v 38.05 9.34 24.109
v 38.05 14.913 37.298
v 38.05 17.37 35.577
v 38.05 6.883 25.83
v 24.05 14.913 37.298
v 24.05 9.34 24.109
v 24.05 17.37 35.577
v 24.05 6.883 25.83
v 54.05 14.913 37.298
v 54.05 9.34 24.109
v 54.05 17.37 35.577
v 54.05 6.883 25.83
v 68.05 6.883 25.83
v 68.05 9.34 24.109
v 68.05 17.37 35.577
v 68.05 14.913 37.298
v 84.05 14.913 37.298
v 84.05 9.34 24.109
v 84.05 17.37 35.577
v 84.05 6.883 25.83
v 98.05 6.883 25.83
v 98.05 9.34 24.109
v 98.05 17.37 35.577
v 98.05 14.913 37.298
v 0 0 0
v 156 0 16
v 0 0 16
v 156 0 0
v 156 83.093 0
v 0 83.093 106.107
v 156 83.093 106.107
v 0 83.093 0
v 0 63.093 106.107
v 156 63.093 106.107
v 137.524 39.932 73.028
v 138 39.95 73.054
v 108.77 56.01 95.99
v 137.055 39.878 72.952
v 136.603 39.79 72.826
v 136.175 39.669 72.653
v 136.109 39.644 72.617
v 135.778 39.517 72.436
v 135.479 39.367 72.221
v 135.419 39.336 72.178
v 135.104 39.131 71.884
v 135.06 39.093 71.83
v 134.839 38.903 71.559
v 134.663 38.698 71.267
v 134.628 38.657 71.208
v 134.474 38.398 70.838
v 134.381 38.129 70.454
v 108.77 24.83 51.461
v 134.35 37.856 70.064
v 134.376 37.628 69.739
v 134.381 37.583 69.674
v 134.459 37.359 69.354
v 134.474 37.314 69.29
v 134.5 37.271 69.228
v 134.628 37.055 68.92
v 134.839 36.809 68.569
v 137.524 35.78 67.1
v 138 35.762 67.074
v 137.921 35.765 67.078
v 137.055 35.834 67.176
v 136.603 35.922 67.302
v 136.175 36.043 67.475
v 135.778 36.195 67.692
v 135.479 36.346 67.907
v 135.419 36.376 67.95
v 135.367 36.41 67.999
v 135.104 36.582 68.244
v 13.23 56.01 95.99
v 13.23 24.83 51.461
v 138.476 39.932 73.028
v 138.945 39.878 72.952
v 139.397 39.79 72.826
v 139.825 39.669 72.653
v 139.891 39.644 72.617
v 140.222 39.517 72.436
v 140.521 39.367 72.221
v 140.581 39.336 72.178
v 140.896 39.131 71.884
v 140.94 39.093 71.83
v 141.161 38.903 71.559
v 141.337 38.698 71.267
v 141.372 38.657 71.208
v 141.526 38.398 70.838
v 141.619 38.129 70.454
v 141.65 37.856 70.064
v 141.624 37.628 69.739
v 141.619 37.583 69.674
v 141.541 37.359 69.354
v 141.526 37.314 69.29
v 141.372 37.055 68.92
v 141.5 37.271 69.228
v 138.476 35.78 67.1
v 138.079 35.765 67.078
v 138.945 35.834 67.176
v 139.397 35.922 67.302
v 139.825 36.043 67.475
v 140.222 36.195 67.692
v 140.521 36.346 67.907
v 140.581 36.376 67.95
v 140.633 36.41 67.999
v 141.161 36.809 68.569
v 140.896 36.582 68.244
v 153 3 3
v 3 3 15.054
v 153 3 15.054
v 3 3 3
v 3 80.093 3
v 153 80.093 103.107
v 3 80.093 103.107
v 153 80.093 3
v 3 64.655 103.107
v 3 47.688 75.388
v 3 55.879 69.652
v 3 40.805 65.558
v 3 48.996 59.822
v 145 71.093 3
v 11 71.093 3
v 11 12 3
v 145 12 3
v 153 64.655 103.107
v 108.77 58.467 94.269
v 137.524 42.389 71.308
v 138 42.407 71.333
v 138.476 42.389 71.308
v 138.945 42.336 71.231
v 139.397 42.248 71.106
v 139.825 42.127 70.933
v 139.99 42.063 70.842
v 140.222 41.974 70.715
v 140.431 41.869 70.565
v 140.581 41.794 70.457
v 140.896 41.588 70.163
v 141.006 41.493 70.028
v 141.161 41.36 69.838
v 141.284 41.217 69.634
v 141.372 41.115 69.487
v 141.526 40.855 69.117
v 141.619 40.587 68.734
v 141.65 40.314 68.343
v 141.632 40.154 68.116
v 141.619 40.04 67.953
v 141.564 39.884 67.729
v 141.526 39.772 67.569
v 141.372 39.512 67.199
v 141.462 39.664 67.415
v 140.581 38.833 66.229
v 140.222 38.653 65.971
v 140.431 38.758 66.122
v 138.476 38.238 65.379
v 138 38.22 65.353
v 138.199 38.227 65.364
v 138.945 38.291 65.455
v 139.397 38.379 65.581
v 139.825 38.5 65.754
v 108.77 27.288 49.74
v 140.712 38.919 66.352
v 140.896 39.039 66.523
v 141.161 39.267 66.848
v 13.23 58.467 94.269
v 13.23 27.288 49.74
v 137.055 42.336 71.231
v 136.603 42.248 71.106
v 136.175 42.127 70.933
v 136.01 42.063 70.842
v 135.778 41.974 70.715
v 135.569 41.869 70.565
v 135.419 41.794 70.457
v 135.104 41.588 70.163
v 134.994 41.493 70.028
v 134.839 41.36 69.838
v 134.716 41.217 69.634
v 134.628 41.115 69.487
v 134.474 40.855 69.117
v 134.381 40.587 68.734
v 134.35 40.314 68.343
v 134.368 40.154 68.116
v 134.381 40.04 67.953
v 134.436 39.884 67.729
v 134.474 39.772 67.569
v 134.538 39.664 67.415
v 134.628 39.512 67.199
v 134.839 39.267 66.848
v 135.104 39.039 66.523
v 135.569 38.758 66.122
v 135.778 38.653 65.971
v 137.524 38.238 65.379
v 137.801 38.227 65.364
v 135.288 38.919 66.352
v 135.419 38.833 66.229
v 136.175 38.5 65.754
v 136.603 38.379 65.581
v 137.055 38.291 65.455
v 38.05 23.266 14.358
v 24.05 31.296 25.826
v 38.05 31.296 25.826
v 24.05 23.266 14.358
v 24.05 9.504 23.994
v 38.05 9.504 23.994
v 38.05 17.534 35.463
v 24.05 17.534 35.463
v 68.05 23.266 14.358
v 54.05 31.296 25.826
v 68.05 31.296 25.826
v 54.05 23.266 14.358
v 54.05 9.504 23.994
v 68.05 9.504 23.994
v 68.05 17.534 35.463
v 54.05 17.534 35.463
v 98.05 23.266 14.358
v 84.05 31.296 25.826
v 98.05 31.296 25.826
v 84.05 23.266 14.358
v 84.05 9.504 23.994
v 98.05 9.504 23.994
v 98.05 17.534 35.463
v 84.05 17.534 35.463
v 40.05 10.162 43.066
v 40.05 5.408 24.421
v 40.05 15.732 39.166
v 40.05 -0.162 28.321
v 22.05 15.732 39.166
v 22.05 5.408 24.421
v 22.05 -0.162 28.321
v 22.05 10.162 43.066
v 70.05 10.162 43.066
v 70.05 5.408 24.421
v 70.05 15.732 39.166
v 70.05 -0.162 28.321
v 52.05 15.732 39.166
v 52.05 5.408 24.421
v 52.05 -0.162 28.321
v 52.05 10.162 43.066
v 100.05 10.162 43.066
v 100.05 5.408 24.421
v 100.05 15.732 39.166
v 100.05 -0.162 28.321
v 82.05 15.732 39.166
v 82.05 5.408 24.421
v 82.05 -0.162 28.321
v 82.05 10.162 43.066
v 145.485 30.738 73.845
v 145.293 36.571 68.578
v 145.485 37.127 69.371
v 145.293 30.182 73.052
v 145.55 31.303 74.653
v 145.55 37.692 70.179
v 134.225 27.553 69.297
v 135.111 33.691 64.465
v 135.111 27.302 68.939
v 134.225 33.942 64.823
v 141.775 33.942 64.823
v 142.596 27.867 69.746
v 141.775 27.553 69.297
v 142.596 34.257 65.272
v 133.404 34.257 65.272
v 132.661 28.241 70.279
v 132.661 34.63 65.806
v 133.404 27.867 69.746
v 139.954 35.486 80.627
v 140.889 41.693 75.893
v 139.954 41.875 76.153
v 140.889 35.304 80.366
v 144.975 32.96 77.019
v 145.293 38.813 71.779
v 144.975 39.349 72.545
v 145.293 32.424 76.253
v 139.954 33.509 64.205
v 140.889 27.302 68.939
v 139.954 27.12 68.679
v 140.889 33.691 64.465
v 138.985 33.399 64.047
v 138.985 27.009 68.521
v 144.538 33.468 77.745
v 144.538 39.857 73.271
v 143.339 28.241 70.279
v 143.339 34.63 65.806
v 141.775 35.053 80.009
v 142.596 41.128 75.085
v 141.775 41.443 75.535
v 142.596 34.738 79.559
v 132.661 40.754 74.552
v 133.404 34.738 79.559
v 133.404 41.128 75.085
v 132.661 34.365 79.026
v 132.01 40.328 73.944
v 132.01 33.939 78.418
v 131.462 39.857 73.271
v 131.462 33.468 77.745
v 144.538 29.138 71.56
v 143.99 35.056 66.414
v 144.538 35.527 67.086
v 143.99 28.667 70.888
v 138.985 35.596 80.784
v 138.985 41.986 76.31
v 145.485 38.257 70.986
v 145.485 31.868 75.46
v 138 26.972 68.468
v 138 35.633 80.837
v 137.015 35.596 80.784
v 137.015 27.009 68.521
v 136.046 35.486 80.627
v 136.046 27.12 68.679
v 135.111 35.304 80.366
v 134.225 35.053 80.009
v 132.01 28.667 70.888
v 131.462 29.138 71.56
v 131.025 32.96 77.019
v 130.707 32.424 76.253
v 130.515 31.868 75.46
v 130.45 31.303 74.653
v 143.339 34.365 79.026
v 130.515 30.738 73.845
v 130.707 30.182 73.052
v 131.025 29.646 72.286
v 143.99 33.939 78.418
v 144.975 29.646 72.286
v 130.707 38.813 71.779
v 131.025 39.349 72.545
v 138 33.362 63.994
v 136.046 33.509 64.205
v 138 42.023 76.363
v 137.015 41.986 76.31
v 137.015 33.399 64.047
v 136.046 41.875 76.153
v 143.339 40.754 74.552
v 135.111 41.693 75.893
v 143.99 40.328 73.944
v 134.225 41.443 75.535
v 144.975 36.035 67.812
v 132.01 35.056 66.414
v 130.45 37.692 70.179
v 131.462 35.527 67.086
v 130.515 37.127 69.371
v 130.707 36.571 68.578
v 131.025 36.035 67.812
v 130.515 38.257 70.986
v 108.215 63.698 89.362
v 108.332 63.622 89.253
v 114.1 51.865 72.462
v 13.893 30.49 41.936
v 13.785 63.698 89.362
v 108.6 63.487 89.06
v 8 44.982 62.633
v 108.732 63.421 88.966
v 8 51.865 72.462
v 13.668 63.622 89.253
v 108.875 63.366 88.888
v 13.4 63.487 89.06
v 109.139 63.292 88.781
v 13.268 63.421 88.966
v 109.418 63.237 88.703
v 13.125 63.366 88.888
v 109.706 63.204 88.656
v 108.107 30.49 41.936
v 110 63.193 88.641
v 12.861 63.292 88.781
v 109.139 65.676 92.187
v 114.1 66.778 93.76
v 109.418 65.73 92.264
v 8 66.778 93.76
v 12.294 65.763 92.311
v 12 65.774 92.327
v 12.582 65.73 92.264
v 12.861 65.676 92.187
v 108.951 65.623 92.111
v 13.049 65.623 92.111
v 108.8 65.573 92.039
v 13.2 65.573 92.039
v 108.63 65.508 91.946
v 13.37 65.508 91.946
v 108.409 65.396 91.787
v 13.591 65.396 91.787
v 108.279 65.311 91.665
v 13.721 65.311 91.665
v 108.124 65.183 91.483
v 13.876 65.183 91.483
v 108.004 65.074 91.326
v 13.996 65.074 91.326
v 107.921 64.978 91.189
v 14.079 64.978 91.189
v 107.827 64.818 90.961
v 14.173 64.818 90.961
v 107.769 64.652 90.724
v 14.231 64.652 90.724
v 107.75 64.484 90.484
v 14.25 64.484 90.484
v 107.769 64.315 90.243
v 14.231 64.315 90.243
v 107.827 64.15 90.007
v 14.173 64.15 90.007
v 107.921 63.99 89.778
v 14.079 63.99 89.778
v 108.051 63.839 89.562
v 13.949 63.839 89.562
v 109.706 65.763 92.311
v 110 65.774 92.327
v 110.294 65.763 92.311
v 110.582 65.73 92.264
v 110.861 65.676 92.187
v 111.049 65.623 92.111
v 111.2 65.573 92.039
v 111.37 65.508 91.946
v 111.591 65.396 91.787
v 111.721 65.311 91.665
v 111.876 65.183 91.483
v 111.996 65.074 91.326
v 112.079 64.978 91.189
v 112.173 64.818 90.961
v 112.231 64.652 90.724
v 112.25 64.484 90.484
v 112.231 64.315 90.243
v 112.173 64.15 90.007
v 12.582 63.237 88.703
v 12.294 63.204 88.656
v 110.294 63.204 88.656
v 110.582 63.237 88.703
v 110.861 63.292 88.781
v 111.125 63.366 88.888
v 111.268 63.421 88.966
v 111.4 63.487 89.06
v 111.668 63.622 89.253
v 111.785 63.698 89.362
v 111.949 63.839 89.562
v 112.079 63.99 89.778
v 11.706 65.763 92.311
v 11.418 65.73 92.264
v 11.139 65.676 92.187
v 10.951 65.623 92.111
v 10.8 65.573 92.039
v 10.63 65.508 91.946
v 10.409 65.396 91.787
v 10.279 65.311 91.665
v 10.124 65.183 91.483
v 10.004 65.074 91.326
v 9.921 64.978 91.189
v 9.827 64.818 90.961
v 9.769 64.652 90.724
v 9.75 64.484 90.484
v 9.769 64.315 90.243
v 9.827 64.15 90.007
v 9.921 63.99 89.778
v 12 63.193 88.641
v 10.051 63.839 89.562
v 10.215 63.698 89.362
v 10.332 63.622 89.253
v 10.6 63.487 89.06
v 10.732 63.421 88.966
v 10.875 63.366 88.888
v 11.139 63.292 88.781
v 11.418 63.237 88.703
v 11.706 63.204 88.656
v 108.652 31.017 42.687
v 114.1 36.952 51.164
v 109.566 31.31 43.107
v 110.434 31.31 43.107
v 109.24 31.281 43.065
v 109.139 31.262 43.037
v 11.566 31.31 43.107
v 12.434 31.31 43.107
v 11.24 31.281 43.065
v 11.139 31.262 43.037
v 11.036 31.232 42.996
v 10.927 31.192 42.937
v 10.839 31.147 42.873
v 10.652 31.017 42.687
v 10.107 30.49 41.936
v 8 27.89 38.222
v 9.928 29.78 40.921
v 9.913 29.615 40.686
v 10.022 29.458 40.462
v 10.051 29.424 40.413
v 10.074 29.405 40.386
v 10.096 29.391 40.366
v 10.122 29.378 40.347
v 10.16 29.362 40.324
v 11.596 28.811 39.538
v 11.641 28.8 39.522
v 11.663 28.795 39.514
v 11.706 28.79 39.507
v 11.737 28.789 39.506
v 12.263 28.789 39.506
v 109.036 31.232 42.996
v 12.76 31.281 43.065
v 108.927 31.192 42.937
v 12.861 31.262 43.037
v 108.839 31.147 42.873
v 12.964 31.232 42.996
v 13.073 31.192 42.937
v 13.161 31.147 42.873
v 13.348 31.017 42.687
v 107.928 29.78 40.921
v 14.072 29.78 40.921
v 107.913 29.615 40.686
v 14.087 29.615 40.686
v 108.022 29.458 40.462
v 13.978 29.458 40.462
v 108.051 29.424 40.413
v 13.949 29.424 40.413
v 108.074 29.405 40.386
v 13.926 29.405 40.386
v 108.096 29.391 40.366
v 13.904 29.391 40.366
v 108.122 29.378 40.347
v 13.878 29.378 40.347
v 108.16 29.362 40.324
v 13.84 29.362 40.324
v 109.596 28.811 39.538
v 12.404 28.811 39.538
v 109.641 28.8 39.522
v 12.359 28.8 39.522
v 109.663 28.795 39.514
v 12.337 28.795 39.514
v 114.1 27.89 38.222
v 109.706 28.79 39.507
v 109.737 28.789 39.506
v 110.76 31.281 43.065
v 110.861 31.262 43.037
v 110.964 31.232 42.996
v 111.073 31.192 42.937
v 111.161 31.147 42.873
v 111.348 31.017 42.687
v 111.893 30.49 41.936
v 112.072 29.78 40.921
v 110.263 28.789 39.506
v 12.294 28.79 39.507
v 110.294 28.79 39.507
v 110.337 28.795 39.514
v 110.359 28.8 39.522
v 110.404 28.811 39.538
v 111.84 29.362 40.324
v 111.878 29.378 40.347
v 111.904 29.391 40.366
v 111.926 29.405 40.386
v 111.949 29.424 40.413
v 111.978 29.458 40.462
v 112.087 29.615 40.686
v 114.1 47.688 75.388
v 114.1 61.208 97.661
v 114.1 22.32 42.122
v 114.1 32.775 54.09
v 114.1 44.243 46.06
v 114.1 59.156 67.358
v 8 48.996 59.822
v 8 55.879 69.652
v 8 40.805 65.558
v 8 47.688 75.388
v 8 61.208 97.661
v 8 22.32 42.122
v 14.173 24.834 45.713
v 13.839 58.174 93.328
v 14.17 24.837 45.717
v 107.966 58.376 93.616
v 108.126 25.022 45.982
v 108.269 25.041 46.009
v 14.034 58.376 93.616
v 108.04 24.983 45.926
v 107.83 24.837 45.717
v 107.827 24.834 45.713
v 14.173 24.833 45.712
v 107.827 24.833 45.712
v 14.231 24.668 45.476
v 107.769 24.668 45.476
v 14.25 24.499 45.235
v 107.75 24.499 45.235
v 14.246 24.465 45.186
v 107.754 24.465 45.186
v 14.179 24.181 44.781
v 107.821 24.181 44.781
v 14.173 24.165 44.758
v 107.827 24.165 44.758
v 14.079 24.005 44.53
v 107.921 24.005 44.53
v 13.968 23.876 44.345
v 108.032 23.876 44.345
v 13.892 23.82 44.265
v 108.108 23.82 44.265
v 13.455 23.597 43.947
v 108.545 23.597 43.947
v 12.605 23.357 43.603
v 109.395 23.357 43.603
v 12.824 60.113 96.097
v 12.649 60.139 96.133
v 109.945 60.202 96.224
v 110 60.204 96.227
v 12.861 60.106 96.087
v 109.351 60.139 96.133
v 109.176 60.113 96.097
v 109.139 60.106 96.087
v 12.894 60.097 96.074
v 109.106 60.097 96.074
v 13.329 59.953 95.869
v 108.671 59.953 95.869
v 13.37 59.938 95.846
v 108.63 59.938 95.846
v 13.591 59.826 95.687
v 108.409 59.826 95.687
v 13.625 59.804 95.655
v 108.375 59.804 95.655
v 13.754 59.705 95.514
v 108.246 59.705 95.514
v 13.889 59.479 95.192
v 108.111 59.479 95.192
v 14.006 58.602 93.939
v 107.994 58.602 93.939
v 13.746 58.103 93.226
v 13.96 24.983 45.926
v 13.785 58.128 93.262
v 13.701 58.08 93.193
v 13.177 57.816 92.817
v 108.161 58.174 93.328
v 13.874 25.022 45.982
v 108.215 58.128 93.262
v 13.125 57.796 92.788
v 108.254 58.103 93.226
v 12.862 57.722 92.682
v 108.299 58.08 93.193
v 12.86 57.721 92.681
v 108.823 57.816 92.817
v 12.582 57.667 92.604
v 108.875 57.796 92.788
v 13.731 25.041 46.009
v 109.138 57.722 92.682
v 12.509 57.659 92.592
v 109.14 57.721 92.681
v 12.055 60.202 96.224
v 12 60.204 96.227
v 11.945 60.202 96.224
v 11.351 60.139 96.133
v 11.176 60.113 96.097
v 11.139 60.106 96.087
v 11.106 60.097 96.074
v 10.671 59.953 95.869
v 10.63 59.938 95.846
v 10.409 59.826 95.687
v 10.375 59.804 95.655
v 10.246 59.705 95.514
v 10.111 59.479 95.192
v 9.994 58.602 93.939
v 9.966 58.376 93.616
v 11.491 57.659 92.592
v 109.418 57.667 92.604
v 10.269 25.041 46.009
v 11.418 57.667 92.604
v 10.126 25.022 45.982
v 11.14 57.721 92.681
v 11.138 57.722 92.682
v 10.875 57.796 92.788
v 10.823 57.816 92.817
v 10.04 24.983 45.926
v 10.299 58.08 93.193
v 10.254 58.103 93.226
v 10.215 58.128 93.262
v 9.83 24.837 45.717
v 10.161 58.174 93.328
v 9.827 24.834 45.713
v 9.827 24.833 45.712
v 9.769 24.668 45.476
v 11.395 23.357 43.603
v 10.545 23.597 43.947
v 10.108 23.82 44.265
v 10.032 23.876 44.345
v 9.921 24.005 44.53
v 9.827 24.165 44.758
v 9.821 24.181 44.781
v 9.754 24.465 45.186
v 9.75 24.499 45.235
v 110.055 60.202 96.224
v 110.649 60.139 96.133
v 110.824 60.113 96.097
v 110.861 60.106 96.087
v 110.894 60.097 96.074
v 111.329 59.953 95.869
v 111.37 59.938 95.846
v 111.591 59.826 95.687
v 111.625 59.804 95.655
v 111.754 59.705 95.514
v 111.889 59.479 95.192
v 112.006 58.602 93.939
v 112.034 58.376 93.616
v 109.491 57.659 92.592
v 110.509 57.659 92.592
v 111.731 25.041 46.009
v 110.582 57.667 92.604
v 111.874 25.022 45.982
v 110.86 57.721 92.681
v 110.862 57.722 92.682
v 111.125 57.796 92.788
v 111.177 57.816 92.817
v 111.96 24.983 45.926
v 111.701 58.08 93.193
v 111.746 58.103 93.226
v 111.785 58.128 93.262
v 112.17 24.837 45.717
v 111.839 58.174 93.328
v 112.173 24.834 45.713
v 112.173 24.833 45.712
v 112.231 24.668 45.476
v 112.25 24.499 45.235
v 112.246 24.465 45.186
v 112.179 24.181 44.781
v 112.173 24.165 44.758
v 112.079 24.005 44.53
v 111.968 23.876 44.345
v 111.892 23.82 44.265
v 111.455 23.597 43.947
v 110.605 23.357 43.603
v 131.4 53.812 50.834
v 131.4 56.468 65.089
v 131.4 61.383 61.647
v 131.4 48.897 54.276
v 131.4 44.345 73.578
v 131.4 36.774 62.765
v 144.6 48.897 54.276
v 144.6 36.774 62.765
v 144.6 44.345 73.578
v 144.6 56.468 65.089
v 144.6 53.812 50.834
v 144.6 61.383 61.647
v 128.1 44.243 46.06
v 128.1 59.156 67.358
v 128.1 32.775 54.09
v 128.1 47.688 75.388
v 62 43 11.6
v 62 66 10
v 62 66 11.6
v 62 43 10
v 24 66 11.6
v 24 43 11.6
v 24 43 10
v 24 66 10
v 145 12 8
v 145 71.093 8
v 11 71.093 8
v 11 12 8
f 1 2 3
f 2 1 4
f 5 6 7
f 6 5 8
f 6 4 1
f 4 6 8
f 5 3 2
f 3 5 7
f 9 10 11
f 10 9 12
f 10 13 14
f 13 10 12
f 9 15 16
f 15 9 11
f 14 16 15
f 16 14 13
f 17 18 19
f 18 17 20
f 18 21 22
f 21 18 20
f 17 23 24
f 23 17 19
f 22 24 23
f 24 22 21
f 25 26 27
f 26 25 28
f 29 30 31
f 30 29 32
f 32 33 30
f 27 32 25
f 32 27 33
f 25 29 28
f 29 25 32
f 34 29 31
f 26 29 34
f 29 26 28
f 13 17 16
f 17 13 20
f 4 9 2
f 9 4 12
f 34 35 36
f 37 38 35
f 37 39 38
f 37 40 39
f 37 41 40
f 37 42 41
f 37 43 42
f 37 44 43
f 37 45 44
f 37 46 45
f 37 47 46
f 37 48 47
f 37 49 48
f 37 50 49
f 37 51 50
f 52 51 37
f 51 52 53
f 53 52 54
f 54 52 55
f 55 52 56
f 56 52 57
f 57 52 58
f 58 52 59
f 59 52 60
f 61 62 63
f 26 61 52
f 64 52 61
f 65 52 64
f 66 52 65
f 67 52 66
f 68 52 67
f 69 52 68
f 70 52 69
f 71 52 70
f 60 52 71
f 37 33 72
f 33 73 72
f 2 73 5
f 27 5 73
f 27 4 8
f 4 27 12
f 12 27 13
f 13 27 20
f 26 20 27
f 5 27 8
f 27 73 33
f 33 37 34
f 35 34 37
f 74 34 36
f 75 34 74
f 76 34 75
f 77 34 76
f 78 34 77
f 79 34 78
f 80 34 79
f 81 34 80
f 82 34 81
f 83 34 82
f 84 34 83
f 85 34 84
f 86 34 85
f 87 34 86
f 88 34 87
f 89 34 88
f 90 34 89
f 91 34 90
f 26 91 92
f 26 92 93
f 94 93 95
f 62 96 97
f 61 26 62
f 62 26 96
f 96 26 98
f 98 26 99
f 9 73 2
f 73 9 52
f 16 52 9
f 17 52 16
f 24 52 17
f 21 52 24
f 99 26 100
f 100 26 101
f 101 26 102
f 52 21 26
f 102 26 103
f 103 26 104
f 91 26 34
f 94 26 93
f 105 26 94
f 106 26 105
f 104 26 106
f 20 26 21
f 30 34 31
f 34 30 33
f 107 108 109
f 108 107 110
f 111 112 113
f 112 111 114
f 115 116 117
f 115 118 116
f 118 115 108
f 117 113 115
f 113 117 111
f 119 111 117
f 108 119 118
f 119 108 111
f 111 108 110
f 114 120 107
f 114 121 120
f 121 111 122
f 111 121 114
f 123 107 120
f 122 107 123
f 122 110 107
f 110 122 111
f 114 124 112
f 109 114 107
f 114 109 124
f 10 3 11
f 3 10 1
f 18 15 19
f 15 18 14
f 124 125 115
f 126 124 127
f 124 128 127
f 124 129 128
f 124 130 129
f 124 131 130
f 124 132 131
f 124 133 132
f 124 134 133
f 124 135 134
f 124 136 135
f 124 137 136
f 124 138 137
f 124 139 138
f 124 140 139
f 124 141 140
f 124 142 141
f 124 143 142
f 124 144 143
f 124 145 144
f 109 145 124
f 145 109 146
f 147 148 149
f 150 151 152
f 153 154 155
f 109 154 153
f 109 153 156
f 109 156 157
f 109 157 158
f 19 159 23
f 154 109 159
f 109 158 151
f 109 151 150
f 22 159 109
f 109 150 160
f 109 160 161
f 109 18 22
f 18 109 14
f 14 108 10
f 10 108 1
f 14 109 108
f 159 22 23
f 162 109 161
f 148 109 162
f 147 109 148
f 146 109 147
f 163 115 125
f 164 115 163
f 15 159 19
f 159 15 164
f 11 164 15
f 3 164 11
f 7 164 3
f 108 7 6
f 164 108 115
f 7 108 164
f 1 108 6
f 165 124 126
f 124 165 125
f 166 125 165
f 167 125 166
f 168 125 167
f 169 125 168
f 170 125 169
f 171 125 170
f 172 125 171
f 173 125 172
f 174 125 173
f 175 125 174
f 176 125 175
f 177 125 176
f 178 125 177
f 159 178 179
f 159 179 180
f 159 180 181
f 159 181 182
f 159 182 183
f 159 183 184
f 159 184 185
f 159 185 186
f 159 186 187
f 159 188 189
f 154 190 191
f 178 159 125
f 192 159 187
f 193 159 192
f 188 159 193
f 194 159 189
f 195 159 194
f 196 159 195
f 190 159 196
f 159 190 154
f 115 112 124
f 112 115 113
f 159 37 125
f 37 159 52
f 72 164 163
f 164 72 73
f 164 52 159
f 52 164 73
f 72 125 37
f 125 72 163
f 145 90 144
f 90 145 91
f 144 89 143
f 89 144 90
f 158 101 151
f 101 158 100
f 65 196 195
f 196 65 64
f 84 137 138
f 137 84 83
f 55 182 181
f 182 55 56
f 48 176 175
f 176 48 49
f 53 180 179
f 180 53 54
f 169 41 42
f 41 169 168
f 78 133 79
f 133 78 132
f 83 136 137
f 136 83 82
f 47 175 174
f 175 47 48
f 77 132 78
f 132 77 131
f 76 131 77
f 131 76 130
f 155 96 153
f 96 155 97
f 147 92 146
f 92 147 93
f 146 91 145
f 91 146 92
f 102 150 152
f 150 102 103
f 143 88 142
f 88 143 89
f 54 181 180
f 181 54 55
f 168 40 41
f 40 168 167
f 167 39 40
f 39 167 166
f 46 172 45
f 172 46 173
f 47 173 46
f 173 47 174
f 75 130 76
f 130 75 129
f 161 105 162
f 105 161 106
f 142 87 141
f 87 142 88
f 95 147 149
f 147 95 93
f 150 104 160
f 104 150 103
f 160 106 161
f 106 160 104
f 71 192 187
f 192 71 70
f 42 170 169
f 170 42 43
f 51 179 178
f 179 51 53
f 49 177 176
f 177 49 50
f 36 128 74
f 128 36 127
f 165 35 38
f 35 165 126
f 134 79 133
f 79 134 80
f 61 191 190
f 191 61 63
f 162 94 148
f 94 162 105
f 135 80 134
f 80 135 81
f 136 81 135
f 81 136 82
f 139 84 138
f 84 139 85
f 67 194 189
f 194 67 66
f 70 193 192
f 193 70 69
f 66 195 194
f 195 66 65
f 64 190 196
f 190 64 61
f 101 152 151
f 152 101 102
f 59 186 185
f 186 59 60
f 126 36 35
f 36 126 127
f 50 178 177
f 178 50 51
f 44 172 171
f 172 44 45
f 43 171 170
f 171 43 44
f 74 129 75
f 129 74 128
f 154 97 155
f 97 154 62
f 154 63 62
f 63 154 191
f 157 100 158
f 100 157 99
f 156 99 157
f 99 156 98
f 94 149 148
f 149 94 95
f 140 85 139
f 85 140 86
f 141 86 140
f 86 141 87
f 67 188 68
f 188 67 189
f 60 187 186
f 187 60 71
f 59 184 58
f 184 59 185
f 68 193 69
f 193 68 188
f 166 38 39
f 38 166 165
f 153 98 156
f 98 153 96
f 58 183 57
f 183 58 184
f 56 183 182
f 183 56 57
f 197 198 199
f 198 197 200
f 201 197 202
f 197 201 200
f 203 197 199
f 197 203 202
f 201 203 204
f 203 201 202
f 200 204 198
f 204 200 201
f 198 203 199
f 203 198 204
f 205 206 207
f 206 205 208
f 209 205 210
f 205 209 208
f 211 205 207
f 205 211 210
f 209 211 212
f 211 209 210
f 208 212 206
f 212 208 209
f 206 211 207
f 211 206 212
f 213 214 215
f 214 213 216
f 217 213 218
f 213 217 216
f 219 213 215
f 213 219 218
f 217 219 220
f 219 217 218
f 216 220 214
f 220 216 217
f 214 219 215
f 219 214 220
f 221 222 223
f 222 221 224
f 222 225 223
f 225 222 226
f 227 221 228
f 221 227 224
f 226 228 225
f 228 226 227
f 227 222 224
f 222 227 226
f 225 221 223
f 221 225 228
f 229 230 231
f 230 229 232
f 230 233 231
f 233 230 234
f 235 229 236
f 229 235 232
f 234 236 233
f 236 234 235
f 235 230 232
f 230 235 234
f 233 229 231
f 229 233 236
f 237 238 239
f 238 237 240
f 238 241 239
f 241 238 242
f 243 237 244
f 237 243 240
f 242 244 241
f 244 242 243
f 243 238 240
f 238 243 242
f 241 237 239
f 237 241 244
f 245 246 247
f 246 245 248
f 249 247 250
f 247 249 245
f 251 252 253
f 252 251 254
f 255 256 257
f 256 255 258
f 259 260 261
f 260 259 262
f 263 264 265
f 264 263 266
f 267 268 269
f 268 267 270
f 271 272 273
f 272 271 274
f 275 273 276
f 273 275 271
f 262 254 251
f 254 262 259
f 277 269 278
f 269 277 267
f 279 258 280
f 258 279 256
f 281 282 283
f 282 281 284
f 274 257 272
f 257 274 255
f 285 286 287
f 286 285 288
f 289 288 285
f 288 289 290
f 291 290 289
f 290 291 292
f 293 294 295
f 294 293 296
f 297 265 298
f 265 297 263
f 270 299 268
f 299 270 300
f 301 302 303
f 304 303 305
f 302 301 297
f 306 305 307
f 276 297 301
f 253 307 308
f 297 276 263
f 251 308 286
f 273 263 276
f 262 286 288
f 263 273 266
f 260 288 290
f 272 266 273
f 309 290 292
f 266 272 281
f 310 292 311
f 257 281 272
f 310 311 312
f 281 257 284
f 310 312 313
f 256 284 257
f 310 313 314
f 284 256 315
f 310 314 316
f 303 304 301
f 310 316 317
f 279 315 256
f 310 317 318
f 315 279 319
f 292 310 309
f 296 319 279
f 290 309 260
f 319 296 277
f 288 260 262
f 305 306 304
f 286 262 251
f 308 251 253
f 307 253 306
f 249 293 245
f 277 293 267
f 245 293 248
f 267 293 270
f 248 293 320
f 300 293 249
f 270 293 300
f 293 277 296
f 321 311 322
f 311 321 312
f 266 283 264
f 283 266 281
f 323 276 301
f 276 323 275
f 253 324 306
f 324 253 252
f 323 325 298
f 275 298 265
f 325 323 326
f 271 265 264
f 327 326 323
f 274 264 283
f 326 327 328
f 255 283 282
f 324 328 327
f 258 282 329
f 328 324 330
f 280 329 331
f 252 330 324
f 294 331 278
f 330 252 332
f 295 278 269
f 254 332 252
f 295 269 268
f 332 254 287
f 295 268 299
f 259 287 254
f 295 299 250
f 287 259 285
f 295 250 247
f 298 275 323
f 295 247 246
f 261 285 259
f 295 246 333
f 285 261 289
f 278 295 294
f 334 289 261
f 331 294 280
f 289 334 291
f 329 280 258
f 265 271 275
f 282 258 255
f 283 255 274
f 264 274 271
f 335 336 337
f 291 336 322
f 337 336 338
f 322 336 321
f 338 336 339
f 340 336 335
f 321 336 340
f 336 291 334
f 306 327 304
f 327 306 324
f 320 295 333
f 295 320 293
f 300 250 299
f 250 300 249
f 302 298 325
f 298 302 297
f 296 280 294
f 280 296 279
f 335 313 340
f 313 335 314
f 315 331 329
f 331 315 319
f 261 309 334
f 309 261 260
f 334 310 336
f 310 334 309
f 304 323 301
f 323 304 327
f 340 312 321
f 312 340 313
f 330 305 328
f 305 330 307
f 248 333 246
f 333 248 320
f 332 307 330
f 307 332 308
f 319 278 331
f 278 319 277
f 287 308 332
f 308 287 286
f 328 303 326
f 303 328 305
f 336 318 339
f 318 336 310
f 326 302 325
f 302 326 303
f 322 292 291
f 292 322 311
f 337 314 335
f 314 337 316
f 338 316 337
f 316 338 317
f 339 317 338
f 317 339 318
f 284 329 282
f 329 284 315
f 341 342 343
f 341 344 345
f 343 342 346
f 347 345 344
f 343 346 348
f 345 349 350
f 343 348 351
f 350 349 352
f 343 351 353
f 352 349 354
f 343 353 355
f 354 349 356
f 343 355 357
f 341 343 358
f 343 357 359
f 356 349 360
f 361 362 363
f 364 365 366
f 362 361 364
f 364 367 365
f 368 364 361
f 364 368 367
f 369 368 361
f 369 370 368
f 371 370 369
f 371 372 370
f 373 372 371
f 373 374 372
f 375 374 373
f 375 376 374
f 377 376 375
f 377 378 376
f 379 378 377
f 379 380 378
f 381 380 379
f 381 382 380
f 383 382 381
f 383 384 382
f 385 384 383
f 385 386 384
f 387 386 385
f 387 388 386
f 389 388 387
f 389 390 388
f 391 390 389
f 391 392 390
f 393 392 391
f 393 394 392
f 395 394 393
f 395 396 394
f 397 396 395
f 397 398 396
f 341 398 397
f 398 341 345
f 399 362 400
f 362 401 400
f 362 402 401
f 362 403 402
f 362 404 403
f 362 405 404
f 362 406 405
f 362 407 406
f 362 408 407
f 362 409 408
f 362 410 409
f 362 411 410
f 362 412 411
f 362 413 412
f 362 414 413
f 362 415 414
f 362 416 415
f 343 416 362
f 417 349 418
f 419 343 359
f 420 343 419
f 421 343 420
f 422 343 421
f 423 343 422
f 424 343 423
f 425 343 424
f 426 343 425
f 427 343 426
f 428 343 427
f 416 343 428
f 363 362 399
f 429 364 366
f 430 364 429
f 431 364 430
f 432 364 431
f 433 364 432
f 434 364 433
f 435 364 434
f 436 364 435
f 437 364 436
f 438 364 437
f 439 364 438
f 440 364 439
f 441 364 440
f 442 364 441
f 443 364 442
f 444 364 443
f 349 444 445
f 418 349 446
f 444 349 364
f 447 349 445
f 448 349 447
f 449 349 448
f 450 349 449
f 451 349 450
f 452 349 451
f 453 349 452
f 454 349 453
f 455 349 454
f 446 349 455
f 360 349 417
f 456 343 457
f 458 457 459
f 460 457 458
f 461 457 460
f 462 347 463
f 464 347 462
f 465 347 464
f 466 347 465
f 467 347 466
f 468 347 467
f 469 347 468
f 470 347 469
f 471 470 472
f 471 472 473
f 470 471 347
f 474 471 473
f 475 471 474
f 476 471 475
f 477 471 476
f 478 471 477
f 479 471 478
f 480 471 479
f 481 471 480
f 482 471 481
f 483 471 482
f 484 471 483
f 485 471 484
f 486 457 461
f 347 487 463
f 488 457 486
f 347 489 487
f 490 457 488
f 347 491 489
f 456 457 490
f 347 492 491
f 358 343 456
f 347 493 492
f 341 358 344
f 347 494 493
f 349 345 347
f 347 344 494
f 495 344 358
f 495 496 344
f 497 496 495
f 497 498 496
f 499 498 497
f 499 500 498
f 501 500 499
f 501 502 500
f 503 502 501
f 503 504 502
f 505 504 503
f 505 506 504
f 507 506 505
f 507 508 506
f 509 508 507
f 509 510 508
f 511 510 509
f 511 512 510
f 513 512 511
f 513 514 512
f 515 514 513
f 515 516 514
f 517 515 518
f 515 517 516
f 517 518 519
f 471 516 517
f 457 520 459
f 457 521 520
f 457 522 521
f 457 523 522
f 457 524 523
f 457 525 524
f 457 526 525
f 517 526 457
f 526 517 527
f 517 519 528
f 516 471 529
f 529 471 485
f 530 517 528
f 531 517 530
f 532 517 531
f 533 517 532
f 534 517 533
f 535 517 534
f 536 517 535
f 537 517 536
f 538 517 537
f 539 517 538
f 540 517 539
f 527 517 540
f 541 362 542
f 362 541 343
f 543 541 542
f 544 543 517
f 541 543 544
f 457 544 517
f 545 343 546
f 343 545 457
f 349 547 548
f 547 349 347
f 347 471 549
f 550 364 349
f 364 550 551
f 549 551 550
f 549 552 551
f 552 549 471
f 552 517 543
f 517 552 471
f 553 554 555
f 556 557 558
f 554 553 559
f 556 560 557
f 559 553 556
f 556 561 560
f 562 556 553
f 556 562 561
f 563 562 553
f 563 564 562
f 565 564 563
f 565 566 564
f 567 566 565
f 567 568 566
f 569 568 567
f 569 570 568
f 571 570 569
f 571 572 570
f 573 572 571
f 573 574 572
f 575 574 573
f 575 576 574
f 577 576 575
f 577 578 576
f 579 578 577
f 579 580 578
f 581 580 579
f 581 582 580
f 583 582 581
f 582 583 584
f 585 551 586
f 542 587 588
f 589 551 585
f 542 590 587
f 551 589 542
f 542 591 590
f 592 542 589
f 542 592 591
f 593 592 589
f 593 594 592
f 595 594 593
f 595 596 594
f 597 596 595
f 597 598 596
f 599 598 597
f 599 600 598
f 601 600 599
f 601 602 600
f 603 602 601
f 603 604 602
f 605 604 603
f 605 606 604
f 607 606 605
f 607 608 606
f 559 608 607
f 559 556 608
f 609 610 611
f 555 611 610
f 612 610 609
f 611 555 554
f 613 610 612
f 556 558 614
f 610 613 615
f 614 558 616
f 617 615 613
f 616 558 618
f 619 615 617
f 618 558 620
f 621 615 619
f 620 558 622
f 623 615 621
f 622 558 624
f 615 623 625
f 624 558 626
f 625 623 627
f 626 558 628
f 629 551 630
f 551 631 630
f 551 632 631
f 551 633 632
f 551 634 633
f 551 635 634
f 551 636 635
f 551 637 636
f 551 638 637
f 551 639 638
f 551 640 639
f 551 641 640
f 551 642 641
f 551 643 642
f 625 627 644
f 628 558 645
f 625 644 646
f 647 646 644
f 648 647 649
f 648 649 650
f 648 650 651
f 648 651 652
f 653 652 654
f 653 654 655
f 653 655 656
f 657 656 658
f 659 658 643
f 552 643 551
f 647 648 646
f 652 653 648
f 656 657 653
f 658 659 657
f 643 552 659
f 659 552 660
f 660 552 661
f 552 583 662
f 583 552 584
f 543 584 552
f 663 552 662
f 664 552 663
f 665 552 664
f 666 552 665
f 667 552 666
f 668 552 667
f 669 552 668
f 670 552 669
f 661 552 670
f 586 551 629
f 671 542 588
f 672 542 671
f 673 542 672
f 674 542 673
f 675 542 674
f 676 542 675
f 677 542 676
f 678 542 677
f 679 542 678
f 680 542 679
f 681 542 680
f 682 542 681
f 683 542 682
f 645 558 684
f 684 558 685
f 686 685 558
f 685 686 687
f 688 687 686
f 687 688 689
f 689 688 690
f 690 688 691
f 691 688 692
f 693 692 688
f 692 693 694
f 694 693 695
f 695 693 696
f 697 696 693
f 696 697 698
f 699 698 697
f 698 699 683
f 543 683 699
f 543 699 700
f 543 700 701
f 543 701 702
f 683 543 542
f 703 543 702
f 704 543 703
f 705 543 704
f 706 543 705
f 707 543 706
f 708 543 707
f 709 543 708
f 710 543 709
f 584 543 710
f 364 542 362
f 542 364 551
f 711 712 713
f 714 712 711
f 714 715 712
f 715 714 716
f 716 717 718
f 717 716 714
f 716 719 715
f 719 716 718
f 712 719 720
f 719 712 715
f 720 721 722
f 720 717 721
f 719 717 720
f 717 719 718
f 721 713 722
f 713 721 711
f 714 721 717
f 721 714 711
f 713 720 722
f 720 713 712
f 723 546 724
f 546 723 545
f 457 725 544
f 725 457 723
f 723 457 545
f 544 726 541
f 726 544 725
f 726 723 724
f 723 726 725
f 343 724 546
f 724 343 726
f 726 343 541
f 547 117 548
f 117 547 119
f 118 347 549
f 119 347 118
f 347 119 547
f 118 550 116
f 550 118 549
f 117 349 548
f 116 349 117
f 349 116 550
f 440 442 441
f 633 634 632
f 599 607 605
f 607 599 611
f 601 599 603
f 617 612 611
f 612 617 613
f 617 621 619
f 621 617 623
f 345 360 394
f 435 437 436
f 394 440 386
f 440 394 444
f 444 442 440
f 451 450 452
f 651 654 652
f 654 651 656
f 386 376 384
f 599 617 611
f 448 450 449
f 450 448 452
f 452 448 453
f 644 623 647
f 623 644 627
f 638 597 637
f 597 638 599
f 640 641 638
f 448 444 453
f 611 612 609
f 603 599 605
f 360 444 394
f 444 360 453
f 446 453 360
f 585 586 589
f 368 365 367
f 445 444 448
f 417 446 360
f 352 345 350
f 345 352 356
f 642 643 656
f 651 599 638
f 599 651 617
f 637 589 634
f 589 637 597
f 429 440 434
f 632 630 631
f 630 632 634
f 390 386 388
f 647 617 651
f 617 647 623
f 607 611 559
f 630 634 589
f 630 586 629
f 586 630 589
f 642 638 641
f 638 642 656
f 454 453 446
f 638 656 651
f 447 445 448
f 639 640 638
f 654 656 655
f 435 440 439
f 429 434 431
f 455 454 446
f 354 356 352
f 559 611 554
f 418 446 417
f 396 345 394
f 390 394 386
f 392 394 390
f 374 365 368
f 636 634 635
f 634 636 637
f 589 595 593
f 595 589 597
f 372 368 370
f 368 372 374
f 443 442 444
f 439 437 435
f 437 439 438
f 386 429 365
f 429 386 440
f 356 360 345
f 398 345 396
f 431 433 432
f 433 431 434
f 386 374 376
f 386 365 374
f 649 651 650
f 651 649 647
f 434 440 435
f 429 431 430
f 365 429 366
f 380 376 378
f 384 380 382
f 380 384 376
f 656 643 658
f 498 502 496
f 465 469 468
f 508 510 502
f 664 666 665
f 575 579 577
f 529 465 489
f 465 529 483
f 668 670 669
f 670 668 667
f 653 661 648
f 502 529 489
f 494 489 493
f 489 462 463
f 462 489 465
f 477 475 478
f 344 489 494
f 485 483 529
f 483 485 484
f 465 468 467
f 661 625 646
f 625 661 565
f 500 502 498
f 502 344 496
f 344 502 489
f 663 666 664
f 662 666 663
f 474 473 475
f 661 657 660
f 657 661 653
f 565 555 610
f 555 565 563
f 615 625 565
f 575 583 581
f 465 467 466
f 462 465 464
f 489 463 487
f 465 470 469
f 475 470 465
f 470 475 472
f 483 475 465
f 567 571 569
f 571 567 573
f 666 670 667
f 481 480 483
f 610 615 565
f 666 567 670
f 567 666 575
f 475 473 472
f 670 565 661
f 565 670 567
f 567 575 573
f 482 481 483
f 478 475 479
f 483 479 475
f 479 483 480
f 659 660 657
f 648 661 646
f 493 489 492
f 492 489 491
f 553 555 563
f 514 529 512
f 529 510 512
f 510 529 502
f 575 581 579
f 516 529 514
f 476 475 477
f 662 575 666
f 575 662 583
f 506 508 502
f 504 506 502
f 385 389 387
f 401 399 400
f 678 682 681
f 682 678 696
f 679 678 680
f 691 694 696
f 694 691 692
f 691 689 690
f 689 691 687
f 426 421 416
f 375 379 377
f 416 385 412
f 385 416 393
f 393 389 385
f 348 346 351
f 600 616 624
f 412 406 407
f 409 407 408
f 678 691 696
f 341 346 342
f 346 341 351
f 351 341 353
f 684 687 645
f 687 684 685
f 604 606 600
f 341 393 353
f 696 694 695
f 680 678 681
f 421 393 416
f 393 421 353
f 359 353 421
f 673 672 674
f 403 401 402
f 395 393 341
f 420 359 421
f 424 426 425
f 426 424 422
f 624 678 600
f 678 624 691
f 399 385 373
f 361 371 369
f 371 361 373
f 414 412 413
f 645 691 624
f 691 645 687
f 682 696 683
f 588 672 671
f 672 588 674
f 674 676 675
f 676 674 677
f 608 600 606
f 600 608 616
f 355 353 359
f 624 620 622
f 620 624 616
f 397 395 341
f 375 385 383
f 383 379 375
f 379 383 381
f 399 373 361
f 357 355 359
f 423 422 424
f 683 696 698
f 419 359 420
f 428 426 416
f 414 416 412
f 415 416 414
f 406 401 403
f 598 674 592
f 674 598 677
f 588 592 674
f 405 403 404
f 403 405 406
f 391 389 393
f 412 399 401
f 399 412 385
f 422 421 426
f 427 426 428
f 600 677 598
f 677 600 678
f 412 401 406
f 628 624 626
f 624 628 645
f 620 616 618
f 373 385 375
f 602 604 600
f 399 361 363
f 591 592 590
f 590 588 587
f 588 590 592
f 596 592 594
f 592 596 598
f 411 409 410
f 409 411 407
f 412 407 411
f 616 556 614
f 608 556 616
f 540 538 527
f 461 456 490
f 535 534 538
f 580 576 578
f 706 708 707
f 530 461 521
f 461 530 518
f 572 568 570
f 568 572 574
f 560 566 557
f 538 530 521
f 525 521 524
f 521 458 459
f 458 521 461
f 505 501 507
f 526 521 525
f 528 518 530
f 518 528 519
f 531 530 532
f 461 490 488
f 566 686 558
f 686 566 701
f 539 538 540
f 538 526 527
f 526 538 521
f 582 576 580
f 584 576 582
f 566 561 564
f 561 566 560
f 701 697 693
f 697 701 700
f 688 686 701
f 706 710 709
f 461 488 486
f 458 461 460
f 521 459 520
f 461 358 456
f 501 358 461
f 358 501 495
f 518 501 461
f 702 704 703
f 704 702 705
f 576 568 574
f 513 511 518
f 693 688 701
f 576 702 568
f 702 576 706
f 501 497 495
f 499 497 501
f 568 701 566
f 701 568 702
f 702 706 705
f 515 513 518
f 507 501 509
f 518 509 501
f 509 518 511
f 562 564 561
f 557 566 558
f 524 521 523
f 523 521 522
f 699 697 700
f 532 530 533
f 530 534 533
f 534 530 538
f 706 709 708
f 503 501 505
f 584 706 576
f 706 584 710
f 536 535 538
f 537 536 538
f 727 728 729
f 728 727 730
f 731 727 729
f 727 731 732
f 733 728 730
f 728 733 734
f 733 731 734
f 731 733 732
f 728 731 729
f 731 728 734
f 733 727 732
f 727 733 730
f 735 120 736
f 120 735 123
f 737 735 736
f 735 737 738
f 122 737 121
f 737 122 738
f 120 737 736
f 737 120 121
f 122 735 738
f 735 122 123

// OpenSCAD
// file: internal_packaging_params.scad
// AUTO-GENERATED from dimensions.json + internal_packaging_assumptions.json.
// Assumed geometry: NOT a manufacturer fit specification.

W = 156.0;
FACE = 110.0;
ANGLE = 55.0;
CHIN = 16.0;
ROOF = 20.0;
WALL = 3.0;
SCREEN_X = 8.0;
SCREEN_V = 8.0;
SCREEN_W = 106.1;
SCREEN_H = 67.8;
SCREEN_IN = 3.3;
SCREEN_DEPTH = 6.8;
KEY_X = [31.05,61.05,91.05];
KEY_V = 91.0;
SWITCH_SIZE = 14.0;
SWITCH_IN = 3.2;
SWITCH_DEPTH = 16.8;
KNOB_X = 138.0;
KNOB_V = 44.0;
KNOB_D = 15.1;
ENCODER_SIZE = 13.2;
ENCODER_IN = 3.3;
ENCODER_DEPTH = 14.8;
TERMINAL_DEPTH = 6.0;
I2C_EXTENSION = 14.0;
I2C_V = 34.0;
I2C_V_LEN = 26.0;
I2C_IN = 5.0;
I2C_DEPTH = 14.0;
USB_EXTENSION = 6.0;
USB_V = 34.0;
USB_V_LEN = 12.0;
USB_IN = 5.0;
USB_DEPTH = 10.0;
FIX_PITCH_X = 98;
FIX_PITCH_V = 60;
FIXING_MARKER_D = 4.5;
AW_BOARD_SIZE = [38.0,23.0,1.6];
AW_BOARD_WORLD_MIN = [24.0,43.0,10.0];
HATCH_CLEARANCE_Z = 8.0;
// main file
/* SPOTIFY DESK REV B: 3D INTERNAL PACKAGING STUDY, not manufacturing geometry.
  All unknown parts (ports, connectors, standoffs, wiring etc) are illustrative.
  Run internal_packaging.py to regenerate scenario-specific parameters and report.
  Does NOT edit existing sharp/R5 STEP files or implement accurate R5 fillets.
  World X=left-to-right; Y=backwards along desk; Z=vertical from desk.
  Local X=left-to-right, V=down inclined face, W=inward perpendicular to face.
*/
include <internal_packaging_params.scad>

$fn = 48;
show_case = true;
show_components = true;
show_mounting_markers = true;
show_interior_board = true;
show_bottom_access = true;
show_overlap = true;
run = FACE * cos(ANGLE);
height = CHIN + FACE * sin(ANGLE);
depth = run + ROOF;
// Columns: local X, V and W transformed to world X, Y and Z. Inward is +W.
module face_coordinates() {
  multmatrix([[1,0,0,0],
              [0,-cos(ANGLE),sin(ANGLE),run],
              [0,-sin(ANGLE),-cos(ANGLE),height],
              [0,0,0,1]]) children();
}
module face_box(x,v,w,dx,dv,dw) {
  face_coordinates() translate([x,v,w]) cube([dx,dv,dw]);
}
module side_prism(outline,ww,xx=0){
  translate([xx,0,0])
    multmatrix([[0,0,1,0],[1,0,0,0],[0,1,0,0],[0,0,0,1]])
      linear_extrude(height=ww) polygon(outline);
}
module side_approx_shell(){
  section=[[0,0],[depth,0],[depth,height],[run,height],[0,CHIN]];
  difference(){
    side_prism(section,W);
    // OpenSCAD offset creates a *nominal* 3mm inner wall; no real screw bosses.
    translate([WALL,0,0])
      multmatrix([[0,0,1,0],[1,0,0,0],[0,1,0,0],[0,0,0,1]])
        linear_extrude(height=W-2*WALL)
          offset(delta=-WALL) polygon(section);
    // Screen viewing aperture from original Rev B dimensions (NOT toleranced).
    face_box(SCREEN_X+5.23,SCREEN_V+4.35,-2,95.54,54.36,10);
    for(x=KEY_X) face_box(x-7,KEY_V-7,-2,14,14,10);
    face_coordinates() translate([KNOB_X,KNOB_V,-2]) cylinder(d=7.3,h=12);
  }
}
module module_lcd(){
  face_box(SCREEN_X,SCREEN_V,SCREEN_IN,SCREEN_W,SCREEN_H,SCREEN_DEPTH);
}
module mx_bodies(){
  for(x=KEY_X) face_box(x-SWITCH_SIZE/2,KEY_V-SWITCH_SIZE/2,
                      SWITCH_IN,SWITCH_SIZE,SWITCH_SIZE,SWITCH_DEPTH);
}
module encoder_body(){
  face_box(KNOB_X-ENCODER_SIZE/2,KNOB_V-ENCODER_SIZE/2,ENCODER_IN,
           ENCODER_SIZE,ENCODER_SIZE,ENCODER_DEPTH);
}
module encoder_terminals(){
  face_box(KNOB_X-ENCODER_SIZE/2,KNOB_V-ENCODER_SIZE/2,
           ENCODER_IN+ENCODER_DEPTH,ENCODER_SIZE,ENCODER_SIZE,TERMINAL_DEPTH);
}
module right_i2c_envelope(){
  face_box(SCREEN_X+SCREEN_W,I2C_V,I2C_IN,I2C_EXTENSION,I2C_V_LEN,I2C_DEPTH);
}
module left_usb_envelope(){
  face_box(SCREEN_X-USB_EXTENSION,USB_V,USB_IN,USB_EXTENSION,USB_V_LEN,USB_DEPTH);
}
module top_control_surfaces(){
  face_coordinates(){
    for(x=KEY_X)
      color([.85,.9,.96,1])translate([x-9,KEY_V-9,-7.2])cube([18,18,6.8]);
    color([.09,.09,.11,1])translate([KNOB_X,KNOB_V,-8])cylinder(d=KNOB_D,h=7.8);
  }
}
module fixing_markers(){
  // Nominal 98x60 centres, 4mm inboard from board edges. NOT correct screw bores.
  for(x=[SCREEN_X+4,SCREEN_X+4+FIX_PITCH_X])
   for(v=[SCREEN_V+4,SCREEN_V+4+FIX_PITCH_V])
    color([.98,.73,.3,.65])
     face_coordinates()translate([x,v,SCREEN_IN])cylinder(d=FIXING_MARKER_D,h=6.8);
}
module aw_board_envelope(){
  // World-coordinate board placement copied from the historical Rev B assembly.
  // Placement is an arbitrary trial, not an assembly fixture.
  translate(AW_BOARD_WORLD_MIN)cube(AW_BOARD_SIZE);
}
module bottom_access_zone(){
  // Conceptual hatch swept keepout rather than printable removable hatch geometry.
  translate([11,12,0])cube([W-22,depth-24,HATCH_CLEARANCE_Z]);
}
if(show_case) color([.28,.34,.43,.2])side_approx_shell();
if(show_components){
 color([.05,.65,.84,.8])module_lcd();
 color([.38,.7,.8,.85])mx_bodies();
 color([.78,.49,.19,.95])encoder_body();
 color([.8,.65,.25,.55])encoder_terminals();
 color([.97,.39,.28,.45])right_i2c_envelope();
 color([.96,.61,.22,.5])left_usb_envelope();
 top_control_surfaces();
}
if(show_mounting_markers)fixing_markers();
if(show_interior_board)color([.63,.36,.72,.6])aw_board_envelope();
if(show_bottom_access)color([.26,.85,.47,.13])bottom_access_zone();
if(show_overlap)color([1,0,.1,.92])intersection(){right_i2c_envelope();encoder_body();}
// The true sharp and R5 original STEP cases are unchanged and are not rendered.
echo("NOT FOR FABRICATION: R5 and real port/bore/hatch geometry are not represented.");
